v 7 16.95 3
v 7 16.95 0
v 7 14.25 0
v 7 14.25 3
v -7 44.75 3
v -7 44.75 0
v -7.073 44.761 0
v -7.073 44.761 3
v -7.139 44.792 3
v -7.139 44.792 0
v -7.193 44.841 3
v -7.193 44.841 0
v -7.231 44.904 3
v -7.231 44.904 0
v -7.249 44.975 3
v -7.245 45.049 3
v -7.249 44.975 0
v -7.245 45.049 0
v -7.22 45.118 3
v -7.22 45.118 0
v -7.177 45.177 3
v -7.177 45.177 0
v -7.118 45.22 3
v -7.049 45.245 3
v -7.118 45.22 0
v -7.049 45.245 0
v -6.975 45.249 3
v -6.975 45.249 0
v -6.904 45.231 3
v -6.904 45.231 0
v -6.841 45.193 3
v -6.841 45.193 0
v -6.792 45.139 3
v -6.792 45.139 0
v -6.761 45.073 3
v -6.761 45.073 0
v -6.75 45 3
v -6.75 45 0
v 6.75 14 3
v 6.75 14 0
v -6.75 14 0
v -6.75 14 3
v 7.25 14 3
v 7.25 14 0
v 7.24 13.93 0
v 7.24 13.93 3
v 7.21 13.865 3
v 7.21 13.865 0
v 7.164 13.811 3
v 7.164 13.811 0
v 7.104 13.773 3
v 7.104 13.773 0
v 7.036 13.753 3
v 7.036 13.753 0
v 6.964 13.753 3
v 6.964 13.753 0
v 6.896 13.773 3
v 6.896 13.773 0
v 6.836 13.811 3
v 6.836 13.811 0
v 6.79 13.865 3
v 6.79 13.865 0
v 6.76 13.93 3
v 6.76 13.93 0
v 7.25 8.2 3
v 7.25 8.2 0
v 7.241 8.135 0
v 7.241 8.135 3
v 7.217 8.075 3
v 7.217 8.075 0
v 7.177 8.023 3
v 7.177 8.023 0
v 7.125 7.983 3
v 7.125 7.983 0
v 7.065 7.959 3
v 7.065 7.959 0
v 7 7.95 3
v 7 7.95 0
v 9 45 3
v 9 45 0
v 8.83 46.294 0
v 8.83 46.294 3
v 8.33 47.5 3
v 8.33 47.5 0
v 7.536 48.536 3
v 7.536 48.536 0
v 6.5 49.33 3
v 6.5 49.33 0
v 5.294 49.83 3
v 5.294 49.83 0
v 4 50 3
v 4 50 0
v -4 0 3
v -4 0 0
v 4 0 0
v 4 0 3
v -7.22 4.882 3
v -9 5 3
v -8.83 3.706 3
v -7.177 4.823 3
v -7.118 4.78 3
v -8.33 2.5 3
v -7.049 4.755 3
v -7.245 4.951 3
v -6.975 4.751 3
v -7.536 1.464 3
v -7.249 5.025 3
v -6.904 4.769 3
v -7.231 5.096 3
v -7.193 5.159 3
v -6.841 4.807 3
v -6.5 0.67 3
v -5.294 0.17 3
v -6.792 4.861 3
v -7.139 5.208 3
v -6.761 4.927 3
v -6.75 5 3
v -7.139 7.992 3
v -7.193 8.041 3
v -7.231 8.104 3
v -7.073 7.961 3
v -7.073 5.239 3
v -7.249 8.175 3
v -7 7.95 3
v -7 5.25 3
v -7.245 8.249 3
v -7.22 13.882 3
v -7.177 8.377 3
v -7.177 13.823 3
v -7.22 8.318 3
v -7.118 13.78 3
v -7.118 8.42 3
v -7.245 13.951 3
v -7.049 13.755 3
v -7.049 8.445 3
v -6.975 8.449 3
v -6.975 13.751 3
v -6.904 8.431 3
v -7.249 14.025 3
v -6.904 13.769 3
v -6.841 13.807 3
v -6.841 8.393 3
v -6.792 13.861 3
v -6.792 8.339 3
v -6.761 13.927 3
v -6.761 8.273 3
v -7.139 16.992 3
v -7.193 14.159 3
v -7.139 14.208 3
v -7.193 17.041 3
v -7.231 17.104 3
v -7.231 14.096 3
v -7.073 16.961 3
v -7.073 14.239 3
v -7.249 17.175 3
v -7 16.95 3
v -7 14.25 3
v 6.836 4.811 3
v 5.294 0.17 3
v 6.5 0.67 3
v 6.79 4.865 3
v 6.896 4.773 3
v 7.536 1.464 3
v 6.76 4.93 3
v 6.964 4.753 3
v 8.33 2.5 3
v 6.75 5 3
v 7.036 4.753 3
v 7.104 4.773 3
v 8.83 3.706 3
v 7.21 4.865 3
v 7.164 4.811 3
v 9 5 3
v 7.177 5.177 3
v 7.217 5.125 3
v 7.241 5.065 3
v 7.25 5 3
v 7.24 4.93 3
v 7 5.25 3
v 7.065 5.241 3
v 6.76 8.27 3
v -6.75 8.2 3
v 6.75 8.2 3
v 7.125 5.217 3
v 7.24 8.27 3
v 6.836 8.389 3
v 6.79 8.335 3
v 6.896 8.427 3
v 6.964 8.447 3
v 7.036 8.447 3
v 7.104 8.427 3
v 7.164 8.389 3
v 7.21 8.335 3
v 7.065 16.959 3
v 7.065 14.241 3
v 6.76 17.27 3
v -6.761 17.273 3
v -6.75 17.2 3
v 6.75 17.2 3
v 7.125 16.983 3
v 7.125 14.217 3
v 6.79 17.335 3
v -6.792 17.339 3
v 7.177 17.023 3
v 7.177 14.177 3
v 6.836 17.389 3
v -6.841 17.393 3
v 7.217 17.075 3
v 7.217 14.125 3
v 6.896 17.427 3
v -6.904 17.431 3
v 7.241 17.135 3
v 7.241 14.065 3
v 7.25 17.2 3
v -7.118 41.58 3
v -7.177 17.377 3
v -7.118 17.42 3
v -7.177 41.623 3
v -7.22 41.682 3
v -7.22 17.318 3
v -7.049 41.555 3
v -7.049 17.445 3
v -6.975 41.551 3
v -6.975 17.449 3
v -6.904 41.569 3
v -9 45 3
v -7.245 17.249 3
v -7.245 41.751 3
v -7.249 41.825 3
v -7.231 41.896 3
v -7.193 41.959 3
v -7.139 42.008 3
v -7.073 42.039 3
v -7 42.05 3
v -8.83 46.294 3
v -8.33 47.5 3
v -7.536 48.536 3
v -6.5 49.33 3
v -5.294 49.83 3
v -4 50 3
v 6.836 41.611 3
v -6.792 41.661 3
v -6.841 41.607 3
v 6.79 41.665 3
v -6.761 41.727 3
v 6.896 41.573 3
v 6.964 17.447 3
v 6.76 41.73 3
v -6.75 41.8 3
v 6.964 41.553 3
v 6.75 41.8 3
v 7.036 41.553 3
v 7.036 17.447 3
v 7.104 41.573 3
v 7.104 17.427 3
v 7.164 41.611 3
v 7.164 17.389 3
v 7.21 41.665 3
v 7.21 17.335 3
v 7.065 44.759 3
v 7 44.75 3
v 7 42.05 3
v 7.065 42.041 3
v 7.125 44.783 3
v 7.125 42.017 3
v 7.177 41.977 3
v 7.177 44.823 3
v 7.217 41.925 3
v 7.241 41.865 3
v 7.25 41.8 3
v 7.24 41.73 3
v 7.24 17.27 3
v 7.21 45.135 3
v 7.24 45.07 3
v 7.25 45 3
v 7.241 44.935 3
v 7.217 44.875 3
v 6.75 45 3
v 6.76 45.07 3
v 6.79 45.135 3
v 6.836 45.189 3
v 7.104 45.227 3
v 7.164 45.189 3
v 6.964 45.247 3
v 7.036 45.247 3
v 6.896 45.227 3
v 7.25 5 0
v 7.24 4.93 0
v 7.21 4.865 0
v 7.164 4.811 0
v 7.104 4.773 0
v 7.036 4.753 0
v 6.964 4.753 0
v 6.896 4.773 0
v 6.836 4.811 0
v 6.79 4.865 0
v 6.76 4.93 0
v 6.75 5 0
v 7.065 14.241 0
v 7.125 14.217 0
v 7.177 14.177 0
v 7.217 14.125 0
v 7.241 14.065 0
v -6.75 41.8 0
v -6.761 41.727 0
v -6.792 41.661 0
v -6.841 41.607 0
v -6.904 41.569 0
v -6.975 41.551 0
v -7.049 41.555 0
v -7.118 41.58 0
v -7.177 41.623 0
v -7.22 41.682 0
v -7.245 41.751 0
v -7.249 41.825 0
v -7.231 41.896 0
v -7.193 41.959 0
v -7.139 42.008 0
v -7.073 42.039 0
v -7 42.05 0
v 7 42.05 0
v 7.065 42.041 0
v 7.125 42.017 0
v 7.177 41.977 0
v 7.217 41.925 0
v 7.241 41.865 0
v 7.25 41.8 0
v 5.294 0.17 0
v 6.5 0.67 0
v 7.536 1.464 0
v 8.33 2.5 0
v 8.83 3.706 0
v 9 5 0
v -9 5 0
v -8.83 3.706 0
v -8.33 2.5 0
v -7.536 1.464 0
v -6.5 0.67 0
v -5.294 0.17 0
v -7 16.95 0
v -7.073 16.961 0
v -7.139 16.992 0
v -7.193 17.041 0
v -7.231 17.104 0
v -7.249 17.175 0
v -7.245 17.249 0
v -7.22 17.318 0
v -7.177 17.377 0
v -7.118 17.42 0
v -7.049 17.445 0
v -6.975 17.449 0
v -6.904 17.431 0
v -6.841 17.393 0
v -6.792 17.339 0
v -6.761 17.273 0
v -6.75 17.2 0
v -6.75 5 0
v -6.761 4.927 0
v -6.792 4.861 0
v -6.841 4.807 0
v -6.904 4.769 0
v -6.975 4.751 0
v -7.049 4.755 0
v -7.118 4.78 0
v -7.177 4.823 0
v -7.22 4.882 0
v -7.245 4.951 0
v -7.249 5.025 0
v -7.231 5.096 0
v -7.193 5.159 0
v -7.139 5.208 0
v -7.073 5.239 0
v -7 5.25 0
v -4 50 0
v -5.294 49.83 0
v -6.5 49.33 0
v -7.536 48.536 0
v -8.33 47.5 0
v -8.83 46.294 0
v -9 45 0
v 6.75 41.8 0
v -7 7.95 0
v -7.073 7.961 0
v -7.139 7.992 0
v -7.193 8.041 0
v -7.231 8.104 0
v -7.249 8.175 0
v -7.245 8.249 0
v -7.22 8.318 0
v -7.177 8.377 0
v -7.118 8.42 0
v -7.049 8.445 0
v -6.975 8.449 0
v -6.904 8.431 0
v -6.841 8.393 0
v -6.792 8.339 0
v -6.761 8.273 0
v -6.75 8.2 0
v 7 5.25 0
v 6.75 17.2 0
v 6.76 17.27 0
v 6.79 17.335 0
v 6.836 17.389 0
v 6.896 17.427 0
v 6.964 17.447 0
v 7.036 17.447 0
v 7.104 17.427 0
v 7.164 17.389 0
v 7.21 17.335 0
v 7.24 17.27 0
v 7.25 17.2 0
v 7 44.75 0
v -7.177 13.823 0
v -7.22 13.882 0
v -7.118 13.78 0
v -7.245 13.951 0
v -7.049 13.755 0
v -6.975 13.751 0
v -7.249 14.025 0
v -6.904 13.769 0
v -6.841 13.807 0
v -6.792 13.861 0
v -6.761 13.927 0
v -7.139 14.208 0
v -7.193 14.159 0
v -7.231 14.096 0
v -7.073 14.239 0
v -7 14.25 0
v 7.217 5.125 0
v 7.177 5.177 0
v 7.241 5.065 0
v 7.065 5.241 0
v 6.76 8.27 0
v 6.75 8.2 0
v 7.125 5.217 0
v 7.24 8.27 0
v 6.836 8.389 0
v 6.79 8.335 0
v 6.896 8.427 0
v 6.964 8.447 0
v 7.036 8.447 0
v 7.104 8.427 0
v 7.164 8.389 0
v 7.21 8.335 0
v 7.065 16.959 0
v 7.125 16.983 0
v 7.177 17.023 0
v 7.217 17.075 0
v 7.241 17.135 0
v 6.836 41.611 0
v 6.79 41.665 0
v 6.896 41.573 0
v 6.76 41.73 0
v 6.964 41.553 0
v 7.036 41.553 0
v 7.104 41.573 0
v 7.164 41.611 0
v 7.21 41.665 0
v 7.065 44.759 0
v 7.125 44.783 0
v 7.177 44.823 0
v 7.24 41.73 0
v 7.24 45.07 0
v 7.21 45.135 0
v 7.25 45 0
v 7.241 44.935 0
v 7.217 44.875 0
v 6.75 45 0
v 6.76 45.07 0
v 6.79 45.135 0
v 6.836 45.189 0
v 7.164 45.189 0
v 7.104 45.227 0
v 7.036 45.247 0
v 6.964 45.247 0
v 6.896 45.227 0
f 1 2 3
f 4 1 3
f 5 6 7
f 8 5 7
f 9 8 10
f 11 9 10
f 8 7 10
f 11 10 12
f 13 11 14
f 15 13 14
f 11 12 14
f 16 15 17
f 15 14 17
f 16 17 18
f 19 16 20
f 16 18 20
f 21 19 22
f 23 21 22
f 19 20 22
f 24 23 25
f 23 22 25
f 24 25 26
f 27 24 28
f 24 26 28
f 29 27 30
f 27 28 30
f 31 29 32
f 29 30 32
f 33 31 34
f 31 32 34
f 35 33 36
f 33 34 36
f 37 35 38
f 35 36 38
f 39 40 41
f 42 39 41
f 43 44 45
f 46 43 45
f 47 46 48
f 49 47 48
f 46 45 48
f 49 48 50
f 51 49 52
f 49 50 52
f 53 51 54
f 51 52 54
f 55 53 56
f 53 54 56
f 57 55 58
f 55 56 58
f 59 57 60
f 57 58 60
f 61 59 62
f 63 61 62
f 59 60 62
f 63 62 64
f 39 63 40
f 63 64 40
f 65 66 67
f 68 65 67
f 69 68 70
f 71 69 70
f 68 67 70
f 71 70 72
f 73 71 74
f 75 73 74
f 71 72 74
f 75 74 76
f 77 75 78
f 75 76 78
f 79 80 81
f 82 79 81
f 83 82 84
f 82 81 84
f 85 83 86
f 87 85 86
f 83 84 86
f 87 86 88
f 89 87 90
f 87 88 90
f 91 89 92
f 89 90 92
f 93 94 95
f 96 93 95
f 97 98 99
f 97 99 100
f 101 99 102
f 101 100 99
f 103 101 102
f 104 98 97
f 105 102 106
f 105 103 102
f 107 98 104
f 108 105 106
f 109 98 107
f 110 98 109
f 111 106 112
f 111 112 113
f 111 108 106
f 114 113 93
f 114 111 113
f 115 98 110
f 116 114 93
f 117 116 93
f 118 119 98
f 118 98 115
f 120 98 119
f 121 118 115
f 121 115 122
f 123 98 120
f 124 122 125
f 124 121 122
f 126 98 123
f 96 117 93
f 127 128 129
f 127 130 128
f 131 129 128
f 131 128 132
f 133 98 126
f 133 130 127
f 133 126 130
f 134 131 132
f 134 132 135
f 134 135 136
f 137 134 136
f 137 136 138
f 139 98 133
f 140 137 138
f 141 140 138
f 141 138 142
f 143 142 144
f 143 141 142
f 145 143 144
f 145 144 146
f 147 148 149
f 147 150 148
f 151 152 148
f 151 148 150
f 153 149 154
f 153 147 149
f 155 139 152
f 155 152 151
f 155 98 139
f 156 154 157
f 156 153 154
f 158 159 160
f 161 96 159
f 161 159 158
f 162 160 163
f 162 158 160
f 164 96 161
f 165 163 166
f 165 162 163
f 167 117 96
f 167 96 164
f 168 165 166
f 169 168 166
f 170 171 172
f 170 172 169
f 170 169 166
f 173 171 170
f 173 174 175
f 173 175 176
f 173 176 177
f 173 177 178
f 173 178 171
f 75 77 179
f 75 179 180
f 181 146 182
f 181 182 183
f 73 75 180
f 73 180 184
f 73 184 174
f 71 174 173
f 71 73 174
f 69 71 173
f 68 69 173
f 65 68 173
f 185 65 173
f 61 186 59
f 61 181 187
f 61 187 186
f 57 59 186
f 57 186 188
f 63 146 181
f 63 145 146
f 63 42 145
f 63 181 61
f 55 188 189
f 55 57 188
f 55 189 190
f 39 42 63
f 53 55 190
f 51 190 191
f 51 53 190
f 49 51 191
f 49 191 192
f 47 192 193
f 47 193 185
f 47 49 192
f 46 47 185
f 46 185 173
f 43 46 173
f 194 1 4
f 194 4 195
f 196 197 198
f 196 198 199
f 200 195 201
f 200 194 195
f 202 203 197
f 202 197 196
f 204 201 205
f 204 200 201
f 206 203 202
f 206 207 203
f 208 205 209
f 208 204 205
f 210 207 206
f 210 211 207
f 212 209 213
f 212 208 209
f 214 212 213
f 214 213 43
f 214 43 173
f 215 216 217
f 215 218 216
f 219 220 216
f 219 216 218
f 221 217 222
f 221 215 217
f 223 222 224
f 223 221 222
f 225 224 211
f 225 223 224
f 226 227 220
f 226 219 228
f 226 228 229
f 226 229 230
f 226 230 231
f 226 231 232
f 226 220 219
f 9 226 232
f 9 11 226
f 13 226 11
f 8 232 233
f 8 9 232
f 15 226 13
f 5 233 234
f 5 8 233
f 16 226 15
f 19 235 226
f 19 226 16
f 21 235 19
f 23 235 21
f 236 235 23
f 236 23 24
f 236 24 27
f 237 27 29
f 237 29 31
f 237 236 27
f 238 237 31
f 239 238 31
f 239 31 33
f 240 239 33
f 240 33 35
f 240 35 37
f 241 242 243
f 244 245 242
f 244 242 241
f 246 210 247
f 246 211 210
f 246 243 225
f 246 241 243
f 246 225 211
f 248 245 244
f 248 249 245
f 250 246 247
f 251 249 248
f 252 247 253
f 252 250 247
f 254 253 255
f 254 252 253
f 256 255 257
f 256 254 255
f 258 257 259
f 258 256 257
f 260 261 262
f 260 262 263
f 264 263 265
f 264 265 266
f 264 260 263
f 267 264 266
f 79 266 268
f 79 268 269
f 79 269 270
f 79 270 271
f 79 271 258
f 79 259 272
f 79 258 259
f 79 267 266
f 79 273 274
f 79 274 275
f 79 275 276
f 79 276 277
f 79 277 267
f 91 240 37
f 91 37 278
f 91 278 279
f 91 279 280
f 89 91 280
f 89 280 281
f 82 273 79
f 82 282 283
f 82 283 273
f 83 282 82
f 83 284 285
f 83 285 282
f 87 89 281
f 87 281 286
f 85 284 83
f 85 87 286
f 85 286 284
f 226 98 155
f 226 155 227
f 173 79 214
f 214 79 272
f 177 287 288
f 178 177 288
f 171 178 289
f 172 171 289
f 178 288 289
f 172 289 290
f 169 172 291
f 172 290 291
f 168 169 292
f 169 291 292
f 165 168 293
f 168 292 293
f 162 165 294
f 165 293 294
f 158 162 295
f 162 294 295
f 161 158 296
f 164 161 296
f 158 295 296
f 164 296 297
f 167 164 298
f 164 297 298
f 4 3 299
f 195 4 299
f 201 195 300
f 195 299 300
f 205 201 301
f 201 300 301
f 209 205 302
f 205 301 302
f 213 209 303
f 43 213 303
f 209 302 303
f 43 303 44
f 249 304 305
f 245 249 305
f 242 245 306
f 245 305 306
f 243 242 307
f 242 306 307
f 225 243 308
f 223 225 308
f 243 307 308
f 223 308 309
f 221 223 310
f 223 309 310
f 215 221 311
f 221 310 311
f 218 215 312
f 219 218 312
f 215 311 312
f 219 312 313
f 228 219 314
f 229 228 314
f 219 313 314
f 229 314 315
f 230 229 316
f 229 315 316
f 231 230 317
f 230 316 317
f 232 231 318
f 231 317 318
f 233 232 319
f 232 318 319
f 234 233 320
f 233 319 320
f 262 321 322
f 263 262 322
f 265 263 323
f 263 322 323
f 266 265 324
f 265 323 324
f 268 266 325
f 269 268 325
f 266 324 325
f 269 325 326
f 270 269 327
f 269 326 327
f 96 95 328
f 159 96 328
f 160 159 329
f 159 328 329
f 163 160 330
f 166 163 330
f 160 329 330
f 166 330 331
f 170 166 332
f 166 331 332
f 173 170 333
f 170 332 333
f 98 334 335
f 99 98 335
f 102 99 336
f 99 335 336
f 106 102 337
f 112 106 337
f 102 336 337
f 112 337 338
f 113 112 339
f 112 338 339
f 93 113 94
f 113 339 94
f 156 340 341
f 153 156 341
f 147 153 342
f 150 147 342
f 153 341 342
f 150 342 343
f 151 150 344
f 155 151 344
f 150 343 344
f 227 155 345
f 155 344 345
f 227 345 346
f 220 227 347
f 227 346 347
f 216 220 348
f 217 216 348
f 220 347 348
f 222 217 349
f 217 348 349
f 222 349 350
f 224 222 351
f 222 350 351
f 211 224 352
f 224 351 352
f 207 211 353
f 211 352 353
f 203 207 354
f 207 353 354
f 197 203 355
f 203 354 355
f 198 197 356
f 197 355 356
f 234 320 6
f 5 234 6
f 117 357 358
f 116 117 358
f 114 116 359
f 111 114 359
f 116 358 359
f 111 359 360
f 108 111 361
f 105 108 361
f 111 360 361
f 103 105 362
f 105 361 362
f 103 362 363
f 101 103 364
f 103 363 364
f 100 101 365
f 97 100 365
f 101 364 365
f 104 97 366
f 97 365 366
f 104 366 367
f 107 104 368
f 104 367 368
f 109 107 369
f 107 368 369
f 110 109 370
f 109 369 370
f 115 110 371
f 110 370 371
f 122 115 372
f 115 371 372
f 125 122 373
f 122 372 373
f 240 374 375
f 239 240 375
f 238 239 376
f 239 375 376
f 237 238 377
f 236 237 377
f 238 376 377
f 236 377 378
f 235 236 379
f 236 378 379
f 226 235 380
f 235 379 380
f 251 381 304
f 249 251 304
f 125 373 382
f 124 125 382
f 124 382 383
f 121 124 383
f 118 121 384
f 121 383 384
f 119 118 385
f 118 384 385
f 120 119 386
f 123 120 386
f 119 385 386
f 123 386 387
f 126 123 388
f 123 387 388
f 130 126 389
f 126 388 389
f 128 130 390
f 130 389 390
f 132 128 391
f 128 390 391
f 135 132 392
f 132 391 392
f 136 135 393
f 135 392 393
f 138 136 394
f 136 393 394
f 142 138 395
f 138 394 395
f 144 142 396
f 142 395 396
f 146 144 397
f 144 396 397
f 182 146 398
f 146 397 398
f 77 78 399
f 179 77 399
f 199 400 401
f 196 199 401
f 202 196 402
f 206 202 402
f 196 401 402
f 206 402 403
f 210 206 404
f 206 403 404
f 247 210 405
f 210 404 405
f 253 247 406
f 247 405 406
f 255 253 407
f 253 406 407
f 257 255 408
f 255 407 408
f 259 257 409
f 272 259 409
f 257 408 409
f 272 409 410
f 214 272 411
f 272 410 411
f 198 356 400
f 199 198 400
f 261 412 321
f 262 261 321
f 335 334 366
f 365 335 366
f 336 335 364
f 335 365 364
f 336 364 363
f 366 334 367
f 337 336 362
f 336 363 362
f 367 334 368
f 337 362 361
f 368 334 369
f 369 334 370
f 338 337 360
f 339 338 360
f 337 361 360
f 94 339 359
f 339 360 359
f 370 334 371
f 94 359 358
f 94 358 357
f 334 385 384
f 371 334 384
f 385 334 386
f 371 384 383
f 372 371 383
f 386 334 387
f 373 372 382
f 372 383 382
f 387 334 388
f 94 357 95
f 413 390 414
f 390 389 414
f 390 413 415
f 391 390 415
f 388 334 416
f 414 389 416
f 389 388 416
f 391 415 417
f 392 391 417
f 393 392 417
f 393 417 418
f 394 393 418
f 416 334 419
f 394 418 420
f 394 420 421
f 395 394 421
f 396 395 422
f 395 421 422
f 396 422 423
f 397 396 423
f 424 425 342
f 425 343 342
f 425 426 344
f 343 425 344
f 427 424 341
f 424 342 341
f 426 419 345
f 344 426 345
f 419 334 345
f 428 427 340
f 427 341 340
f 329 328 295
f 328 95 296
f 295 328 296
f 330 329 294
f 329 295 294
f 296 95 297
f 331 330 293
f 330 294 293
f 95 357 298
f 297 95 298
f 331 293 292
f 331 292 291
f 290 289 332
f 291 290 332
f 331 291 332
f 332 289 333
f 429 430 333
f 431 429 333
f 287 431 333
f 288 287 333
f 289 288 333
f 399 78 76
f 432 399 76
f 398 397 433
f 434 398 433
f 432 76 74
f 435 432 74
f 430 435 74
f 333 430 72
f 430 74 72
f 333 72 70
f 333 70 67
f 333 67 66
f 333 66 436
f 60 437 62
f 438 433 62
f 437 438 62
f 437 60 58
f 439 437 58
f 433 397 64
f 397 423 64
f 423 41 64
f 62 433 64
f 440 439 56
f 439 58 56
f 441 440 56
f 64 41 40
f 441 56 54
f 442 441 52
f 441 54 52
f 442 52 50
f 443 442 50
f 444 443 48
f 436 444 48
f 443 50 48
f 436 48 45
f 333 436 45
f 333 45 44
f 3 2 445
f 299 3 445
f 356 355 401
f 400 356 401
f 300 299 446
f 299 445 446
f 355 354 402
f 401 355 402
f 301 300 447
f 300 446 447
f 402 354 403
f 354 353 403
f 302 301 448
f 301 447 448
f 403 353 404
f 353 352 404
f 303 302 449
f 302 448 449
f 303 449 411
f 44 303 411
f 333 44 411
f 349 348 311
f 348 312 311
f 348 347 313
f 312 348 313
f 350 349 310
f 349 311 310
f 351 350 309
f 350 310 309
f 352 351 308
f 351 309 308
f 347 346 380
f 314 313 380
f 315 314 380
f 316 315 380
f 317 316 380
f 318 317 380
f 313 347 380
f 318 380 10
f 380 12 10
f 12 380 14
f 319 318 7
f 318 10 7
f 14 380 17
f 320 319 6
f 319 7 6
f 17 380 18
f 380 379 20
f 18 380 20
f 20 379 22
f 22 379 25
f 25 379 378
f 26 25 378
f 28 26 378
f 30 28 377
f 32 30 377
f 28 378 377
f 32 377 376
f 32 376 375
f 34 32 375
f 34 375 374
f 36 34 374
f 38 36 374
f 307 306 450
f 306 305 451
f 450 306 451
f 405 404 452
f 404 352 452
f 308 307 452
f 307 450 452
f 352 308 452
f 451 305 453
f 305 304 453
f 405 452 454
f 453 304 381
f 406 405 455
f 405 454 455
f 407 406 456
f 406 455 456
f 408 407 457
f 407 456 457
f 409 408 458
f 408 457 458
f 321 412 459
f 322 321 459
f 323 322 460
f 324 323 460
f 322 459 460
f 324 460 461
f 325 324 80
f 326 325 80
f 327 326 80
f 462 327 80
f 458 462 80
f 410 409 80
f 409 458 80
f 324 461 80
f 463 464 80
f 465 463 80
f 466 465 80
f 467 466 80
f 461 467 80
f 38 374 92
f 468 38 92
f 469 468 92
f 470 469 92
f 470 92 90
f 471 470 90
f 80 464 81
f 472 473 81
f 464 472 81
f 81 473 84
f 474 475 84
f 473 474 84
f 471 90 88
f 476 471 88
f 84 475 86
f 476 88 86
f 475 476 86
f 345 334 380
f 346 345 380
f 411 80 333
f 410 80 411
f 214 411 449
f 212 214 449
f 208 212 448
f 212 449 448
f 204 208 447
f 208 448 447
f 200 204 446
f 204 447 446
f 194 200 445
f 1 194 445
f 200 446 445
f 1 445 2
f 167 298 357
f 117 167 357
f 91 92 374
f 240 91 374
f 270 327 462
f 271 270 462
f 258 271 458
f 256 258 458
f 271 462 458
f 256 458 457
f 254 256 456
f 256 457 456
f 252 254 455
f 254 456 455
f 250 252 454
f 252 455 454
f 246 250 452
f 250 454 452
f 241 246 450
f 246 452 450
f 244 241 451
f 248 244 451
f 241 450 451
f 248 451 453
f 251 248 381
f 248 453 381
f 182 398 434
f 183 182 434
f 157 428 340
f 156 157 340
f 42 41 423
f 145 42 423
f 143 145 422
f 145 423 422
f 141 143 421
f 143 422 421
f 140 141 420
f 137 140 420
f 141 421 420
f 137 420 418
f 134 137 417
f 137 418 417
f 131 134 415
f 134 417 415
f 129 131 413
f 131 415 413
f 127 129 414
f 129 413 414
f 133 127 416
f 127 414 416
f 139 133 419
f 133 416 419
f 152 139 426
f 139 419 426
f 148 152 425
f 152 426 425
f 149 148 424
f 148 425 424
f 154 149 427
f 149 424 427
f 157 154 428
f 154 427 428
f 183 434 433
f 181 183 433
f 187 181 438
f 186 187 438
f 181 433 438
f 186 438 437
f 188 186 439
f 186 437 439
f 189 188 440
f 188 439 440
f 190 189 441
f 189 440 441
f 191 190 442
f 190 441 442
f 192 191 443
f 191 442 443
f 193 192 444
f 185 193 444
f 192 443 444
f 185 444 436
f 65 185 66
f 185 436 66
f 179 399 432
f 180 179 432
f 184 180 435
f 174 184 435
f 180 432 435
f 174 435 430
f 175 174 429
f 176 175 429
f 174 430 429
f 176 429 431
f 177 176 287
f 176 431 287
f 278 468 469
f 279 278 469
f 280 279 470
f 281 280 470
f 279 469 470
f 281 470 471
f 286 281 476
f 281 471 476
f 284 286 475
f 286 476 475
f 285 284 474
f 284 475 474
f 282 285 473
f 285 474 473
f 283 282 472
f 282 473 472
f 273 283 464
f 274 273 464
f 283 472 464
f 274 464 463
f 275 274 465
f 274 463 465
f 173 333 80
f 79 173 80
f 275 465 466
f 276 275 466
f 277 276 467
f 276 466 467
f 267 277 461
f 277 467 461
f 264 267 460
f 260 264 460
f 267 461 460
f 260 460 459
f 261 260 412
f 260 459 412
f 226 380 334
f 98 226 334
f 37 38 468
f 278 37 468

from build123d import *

# Parameters (mm, degrees)
F1_DEPTH = 3


with BuildPart() as f1:
    # F0 (on Top) → F1 (new body)
    with BuildSketch(Plane.XY):
        with BuildLine():
            Line((4, 50), (-4, 50))
            ThreePointArc((-4, 50), (-7.535534, 48.535534), (-9, 45))
            Line((-9, 45), (-9, 5))
            ThreePointArc((-9, 5), (-7.535534, 1.464466), (-4, 0))
            Line((-4, 0), (4, 0))
            ThreePointArc((4, 0), (7.535534, 1.464466), (9, 5))
            Line((9, 5), (9, 45))
            ThreePointArc((9, 45), (7.535534, 48.535534), (4, 50))
        make_face()
        with BuildLine():
            ThreePointArc((-7, 7.95), (-7.176777, 8.376777), (-6.75, 8.2))
            Line((-6.75, 8.2), (6.75, 8.2))
            ThreePointArc((6.75, 8.2), (7, 8.45), (7.25, 8.2))
            ThreePointArc((7.25, 8.2), (7.176777, 8.023223), (7, 7.95))
            Line((7, 7.95), (7, 5.25))
            ThreePointArc((7, 5.25), (7.176777, 5.176777), (7.25, 5))
            ThreePointArc((7.25, 5), (7, 4.75), (6.75, 5))
            Line((6.75, 5), (-6.75, 5))
            ThreePointArc((-6.75, 5), (-7.176777, 4.823223), (-7, 5.25))
            Line((-7, 5.25), (-7, 7.95))
        make_face(mode=Mode.SUBTRACT)
        with BuildLine():
            ThreePointArc((-7, 16.95), (-7.176777, 17.376777), (-6.75, 17.2))
            Line((-6.75, 17.2), (6.75, 17.2))
            ThreePointArc((6.75, 17.2), (7, 17.45), (7.25, 17.2))
            ThreePointArc((7.25, 17.2), (7.176777, 17.023223), (7, 16.95))
            Line((7, 16.95), (7, 14.25))
            ThreePointArc((7, 14.25), (7.176777, 14.176777), (7.25, 14))
            ThreePointArc((7.25, 14), (7, 13.75), (6.75, 14))
            Line((6.75, 14), (-6.75, 14))
            ThreePointArc((-6.75, 14), (-7.176777, 13.823223), (-7, 14.25))
            Line((-7, 14.25), (-7, 16.95))
        make_face(mode=Mode.SUBTRACT)
        with BuildLine():
            ThreePointArc((-7, 44.75), (-7.176777, 45.176777), (-6.75, 45))
            Line((-6.75, 45), (6.75, 45))
            ThreePointArc((6.75, 45), (7, 45.25), (7.25, 45))
            ThreePointArc((7.25, 45), (7.176777, 44.823223), (7, 44.75))
            Line((7, 44.75), (7, 42.05))
            ThreePointArc((7, 42.05), (7.176777, 41.976777), (7.25, 41.8))
            ThreePointArc((7.25, 41.8), (7, 41.55), (6.75, 41.8))
            Line((6.75, 41.8), (-6.75, 41.8))
            ThreePointArc((-6.75, 41.8), (-7.176777, 41.623223), (-7, 42.05))
            Line((-7, 42.05), (-7, 44.75))
        make_face(mode=Mode.SUBTRACT)
    extrude(amount=F1_DEPTH)


solid = f1.part
